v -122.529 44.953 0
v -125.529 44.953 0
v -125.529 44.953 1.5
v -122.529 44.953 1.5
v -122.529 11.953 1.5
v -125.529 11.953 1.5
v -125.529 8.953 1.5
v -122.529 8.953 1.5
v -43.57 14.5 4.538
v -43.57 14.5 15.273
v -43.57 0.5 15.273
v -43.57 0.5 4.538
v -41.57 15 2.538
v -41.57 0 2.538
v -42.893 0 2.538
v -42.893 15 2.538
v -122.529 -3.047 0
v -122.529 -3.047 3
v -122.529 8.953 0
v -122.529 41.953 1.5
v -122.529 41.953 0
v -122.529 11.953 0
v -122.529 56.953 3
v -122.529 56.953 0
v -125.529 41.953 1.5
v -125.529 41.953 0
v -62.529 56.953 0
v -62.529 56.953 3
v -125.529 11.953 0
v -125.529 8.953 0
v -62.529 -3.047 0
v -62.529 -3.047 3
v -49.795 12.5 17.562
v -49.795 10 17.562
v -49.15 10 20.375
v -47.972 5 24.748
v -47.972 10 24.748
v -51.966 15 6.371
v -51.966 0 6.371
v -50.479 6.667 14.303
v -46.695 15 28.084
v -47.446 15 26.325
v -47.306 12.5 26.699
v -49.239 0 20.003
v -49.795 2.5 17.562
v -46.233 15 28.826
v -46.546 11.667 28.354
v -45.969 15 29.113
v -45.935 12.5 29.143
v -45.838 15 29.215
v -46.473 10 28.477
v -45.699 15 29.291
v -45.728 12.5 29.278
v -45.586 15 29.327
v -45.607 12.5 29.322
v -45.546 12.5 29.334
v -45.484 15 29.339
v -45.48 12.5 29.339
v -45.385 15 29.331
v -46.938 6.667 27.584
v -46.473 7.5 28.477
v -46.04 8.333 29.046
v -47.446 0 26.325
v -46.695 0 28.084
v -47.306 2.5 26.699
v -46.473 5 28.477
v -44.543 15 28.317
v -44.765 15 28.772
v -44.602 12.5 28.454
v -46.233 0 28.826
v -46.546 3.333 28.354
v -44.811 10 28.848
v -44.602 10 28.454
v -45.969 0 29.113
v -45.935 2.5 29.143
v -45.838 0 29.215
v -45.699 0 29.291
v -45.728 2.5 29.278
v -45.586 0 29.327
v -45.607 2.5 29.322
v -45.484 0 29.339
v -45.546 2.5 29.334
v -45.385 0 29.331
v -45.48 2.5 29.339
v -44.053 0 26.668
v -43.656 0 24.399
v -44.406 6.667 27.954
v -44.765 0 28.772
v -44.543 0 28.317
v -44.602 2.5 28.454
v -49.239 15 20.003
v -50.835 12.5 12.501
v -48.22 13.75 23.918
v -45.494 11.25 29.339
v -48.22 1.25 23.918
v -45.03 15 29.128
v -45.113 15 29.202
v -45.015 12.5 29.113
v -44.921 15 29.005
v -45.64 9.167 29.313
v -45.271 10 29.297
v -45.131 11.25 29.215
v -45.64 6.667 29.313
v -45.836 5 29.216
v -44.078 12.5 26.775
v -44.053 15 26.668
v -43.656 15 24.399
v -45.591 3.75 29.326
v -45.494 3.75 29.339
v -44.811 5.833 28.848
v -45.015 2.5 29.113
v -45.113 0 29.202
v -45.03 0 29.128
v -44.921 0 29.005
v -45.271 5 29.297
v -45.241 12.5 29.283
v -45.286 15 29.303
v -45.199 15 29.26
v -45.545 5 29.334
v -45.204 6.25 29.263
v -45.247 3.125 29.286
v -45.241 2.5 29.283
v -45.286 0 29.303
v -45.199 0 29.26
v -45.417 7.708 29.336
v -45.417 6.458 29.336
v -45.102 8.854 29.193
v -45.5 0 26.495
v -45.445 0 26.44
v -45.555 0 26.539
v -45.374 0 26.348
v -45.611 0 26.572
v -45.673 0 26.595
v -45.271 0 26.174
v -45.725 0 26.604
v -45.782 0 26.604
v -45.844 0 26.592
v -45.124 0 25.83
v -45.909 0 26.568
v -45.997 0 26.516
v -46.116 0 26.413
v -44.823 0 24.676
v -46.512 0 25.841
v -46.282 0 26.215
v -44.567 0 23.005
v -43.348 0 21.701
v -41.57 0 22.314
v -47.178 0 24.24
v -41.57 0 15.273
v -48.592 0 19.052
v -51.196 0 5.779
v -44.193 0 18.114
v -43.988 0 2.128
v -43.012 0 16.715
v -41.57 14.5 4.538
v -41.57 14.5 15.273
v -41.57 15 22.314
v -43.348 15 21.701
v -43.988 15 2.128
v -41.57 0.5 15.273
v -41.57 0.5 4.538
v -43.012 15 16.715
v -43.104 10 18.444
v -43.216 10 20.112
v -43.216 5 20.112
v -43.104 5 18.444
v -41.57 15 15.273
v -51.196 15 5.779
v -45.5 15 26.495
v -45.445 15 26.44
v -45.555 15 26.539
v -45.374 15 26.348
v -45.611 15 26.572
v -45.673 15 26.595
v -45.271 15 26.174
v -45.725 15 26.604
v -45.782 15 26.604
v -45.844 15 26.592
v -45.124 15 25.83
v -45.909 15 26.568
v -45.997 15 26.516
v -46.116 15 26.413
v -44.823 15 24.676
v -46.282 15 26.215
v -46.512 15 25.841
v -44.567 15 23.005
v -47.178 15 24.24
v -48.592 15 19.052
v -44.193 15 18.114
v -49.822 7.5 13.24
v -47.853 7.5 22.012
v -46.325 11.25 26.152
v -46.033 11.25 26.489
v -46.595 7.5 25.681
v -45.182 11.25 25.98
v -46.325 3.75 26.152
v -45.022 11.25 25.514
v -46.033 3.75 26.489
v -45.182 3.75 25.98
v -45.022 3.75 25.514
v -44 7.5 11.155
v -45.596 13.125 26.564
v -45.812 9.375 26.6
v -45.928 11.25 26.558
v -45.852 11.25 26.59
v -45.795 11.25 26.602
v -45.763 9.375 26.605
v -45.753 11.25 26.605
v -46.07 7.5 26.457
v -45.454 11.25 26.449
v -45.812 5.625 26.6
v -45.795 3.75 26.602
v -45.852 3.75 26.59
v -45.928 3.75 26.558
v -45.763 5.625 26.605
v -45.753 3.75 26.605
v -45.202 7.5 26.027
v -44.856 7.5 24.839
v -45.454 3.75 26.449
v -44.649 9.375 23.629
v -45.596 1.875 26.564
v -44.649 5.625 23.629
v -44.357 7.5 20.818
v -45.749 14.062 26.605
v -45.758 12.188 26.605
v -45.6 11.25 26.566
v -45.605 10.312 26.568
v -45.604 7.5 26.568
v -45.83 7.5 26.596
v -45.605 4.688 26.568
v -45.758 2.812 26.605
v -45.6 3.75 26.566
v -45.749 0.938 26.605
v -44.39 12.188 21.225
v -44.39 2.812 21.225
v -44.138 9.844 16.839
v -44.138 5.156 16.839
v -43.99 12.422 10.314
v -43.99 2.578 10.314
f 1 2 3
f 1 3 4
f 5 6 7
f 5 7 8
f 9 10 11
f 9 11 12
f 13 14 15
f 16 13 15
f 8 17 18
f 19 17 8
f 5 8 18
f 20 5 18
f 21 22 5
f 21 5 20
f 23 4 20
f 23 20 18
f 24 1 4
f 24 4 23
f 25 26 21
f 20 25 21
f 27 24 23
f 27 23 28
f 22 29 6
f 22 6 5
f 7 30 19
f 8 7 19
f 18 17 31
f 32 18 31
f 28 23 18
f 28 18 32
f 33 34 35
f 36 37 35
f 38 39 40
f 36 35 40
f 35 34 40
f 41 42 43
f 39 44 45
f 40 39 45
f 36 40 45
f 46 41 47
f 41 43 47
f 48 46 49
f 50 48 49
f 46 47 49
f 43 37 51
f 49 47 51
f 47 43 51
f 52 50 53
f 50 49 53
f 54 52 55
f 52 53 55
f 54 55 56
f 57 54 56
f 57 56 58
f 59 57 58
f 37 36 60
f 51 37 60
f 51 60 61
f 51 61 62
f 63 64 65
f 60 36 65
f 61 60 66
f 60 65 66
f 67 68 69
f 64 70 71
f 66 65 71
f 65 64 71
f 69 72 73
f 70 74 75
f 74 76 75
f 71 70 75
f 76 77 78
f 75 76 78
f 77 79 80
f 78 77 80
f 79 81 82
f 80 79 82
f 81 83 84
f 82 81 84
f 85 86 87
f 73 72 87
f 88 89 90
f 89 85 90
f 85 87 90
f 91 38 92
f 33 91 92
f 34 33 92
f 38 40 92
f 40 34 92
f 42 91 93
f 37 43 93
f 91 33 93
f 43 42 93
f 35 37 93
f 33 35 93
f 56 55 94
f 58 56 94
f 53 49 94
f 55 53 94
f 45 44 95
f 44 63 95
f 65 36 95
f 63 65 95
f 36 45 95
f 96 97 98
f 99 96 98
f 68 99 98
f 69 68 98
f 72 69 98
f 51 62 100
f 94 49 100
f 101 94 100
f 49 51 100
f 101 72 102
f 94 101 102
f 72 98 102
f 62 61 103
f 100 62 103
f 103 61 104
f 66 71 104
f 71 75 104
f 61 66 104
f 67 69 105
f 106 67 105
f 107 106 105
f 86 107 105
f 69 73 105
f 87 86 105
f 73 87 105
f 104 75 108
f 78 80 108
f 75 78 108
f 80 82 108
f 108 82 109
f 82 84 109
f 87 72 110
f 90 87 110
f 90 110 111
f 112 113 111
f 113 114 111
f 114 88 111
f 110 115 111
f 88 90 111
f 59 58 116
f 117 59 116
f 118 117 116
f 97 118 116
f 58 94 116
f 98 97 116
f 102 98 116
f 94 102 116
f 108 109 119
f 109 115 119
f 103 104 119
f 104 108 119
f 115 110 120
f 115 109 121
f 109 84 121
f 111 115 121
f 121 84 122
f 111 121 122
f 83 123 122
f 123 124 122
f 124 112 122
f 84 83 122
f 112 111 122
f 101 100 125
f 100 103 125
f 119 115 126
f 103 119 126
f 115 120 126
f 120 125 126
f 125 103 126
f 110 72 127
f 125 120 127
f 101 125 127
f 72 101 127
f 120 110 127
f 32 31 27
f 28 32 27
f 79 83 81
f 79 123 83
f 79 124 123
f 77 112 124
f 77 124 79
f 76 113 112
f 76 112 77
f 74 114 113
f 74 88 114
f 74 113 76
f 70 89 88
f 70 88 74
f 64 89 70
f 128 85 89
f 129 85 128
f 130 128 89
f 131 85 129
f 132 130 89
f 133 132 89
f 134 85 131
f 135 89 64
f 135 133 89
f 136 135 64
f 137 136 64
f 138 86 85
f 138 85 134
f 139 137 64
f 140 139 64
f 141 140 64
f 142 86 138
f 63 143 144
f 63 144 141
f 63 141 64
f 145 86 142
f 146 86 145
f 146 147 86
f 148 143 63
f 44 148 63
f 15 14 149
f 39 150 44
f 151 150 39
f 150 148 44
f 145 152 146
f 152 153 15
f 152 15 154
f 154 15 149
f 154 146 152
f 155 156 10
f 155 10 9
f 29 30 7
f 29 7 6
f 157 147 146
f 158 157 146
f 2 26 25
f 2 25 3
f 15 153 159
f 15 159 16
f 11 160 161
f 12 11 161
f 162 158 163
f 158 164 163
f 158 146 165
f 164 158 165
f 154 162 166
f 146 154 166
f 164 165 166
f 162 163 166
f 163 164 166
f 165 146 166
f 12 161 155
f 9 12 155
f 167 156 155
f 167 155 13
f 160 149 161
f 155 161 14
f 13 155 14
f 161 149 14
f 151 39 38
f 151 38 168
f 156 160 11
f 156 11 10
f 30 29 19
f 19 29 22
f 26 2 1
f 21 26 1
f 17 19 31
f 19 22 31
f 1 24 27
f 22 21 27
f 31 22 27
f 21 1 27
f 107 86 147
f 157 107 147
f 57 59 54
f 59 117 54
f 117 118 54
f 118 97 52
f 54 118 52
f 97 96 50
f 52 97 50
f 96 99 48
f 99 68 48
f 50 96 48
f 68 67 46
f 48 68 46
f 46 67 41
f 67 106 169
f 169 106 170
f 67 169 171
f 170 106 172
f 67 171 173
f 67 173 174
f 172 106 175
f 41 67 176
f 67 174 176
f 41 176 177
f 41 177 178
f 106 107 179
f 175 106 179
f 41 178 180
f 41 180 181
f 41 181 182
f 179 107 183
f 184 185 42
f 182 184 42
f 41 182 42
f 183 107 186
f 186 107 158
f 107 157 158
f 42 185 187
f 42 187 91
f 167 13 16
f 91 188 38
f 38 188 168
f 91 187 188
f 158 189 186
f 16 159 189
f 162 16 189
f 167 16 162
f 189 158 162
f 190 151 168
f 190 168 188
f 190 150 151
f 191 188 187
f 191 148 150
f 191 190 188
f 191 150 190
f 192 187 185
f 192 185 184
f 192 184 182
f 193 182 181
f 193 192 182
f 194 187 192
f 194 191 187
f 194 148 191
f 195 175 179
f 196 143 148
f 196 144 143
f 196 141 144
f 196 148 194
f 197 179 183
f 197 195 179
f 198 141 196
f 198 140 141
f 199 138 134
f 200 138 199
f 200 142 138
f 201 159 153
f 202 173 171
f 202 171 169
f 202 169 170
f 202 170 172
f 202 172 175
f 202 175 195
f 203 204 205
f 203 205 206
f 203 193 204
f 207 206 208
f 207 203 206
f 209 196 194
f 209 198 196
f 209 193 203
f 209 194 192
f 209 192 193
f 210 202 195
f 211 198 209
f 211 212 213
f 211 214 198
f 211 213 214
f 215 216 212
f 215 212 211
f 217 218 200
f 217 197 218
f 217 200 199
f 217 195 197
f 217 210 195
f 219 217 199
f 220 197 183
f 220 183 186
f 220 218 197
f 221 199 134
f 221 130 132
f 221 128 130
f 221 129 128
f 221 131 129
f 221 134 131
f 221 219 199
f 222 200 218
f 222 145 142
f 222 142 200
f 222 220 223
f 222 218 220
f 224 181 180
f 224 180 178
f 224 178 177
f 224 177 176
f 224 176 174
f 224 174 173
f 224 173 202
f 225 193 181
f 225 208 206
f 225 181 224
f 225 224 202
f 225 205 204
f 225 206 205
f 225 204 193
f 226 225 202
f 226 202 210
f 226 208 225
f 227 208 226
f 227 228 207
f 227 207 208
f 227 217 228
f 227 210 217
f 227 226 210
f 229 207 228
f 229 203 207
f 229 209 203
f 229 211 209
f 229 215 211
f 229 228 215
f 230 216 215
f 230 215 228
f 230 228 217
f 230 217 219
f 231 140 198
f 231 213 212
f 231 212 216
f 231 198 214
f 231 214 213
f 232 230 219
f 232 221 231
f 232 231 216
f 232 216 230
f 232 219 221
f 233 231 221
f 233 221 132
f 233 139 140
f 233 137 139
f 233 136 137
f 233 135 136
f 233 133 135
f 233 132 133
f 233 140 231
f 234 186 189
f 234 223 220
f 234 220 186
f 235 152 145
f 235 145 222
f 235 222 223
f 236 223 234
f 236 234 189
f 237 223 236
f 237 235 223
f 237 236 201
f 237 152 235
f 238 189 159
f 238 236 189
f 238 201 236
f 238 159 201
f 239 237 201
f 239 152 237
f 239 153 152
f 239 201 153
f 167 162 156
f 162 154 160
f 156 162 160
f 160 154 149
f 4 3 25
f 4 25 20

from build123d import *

# Parameters (mm, degrees)
ESQUISSE2_W             = 60
ESQUISSE2_H             = 60
BOSS_EXTRU_5_DEPTH      = 3
ESQUISSE4_W             = 3
ESQUISSE4_H             = 3
BOSS_EXTRU_6_DEPTH      = 1.5
BOSS_EXTRU_7_DEPTH      = 15
ESQUISSE6_W             = 10.73554263
ESQUISSE6_H             = 14
ENL_V_MAT_EXTRU_3_DEPTH = 2


with BuildPart() as part:
    # Esquisse2 → Boss.-Extru.5 (new body)
    with BuildSketch(Plane.XY):
        with Locations((-92.529091576, 26.952913469)):
            Rectangle(ESQUISSE2_W, ESQUISSE2_H)
    extrude(amount=BOSS_EXTRU_5_DEPTH)

    # Esquisse4 → Boss.-Extru.6 (add)
    with BuildSketch(Plane.XY):
        with Locations((-124.029091576, 43.452913469)):
            Rectangle(ESQUISSE4_W, ESQUISSE4_H)
        with Locations((-124.029091576, 10.452913469)):
            Rectangle(ESQUISSE4_W, ESQUISSE4_H)
    extrude(amount=BOSS_EXTRU_6_DEPTH)


with BuildPart() as body_2:
    # Esquisse5 → Boss.-Extru.7 (new body)
    with BuildSketch(Plane(origin=(0, 0, 0), x_dir=(1, 0, 0), z_dir=(0, 1, 0))):
        with BuildLine():
            add(Edge.make_bspline(
                [(-51.196275426, -5.778879221), (-43.615971935, -49.182959999), (-43.988419185, -2.128215511)],
                knots=[0, 0, 0, 1, 1, 1], degree=2))
            Line((-43.988419185, -2.128215511), (-42.89303889, -2.537863847))
            add(Edge.make_bspline(
                [(-51.966076605, -6.370882605), (-43.906365512, -52.160925825), (-42.431120628, -17.92359053), (-42.89303889, -2.537863847)],
                knots=[0, 0, 0, 0, 1, 1, 1, 1], degree=3))
            Line((-51.966076605, -6.370882605), (-51.196275426, -5.778879221))
        make_face()
        with BuildLine():
            add(Edge.make_bspline(
                [(-43.655572035, -24.398887349), (-43.539836944, -23.57085318), (-43.437699228, -22.664594203), (-43.348190801, -21.700707969)],
                knots=[0.584216968, 0.584216968, 0.584216968, 0.584216968, 0.643496376, 0.643496376, 0.643496376, 0.643496376], degree=3))
            Line((-43.655572035, -24.398887349), (-41.570382682, -22.313697996))
            Line((-41.570382682, -22.313697996), (-43.348190801, -21.700707969))
        make_face()
        with BuildLine():
            add(Edge.make_bspline(
                [(-43.011516669, -16.714540464), (-42.78393513, -11.879120869), (-42.772185803, -6.563278554), (-42.89303889, -2.537863847)],
                knots=[0.738366943, 0.738366943, 0.738366943, 0.738366943, 1, 1, 1, 1], degree=3))
            Line((-43.011516669, -16.714540464), (-41.570382682, -15.273406477))
            Line((-41.570382682, -15.273406477), (-41.570382682, -2.537863847))
            Line((-41.570382682, -2.537863847), (-42.89303889, -2.537863847))
        make_face()
    extrude(amount=BOSS_EXTRU_7_DEPTH)

    # Esquisse6 → Enlèv. mat.-Extru.3 (cut)
    with BuildSketch(Plane(origin=(-41.570382682, 0, 0), x_dir=(0, 0, -1), z_dir=(1, 0, 0))):
        with Locations((-9.905635162, 7.5)):
            Rectangle(ESQUISSE6_W, ESQUISSE6_H)
    extrude(amount=-ENL_V_MAT_EXTRU_3_DEPTH, mode=Mode.SUBTRACT)


solid = Compound([part.part, body_2.part])
